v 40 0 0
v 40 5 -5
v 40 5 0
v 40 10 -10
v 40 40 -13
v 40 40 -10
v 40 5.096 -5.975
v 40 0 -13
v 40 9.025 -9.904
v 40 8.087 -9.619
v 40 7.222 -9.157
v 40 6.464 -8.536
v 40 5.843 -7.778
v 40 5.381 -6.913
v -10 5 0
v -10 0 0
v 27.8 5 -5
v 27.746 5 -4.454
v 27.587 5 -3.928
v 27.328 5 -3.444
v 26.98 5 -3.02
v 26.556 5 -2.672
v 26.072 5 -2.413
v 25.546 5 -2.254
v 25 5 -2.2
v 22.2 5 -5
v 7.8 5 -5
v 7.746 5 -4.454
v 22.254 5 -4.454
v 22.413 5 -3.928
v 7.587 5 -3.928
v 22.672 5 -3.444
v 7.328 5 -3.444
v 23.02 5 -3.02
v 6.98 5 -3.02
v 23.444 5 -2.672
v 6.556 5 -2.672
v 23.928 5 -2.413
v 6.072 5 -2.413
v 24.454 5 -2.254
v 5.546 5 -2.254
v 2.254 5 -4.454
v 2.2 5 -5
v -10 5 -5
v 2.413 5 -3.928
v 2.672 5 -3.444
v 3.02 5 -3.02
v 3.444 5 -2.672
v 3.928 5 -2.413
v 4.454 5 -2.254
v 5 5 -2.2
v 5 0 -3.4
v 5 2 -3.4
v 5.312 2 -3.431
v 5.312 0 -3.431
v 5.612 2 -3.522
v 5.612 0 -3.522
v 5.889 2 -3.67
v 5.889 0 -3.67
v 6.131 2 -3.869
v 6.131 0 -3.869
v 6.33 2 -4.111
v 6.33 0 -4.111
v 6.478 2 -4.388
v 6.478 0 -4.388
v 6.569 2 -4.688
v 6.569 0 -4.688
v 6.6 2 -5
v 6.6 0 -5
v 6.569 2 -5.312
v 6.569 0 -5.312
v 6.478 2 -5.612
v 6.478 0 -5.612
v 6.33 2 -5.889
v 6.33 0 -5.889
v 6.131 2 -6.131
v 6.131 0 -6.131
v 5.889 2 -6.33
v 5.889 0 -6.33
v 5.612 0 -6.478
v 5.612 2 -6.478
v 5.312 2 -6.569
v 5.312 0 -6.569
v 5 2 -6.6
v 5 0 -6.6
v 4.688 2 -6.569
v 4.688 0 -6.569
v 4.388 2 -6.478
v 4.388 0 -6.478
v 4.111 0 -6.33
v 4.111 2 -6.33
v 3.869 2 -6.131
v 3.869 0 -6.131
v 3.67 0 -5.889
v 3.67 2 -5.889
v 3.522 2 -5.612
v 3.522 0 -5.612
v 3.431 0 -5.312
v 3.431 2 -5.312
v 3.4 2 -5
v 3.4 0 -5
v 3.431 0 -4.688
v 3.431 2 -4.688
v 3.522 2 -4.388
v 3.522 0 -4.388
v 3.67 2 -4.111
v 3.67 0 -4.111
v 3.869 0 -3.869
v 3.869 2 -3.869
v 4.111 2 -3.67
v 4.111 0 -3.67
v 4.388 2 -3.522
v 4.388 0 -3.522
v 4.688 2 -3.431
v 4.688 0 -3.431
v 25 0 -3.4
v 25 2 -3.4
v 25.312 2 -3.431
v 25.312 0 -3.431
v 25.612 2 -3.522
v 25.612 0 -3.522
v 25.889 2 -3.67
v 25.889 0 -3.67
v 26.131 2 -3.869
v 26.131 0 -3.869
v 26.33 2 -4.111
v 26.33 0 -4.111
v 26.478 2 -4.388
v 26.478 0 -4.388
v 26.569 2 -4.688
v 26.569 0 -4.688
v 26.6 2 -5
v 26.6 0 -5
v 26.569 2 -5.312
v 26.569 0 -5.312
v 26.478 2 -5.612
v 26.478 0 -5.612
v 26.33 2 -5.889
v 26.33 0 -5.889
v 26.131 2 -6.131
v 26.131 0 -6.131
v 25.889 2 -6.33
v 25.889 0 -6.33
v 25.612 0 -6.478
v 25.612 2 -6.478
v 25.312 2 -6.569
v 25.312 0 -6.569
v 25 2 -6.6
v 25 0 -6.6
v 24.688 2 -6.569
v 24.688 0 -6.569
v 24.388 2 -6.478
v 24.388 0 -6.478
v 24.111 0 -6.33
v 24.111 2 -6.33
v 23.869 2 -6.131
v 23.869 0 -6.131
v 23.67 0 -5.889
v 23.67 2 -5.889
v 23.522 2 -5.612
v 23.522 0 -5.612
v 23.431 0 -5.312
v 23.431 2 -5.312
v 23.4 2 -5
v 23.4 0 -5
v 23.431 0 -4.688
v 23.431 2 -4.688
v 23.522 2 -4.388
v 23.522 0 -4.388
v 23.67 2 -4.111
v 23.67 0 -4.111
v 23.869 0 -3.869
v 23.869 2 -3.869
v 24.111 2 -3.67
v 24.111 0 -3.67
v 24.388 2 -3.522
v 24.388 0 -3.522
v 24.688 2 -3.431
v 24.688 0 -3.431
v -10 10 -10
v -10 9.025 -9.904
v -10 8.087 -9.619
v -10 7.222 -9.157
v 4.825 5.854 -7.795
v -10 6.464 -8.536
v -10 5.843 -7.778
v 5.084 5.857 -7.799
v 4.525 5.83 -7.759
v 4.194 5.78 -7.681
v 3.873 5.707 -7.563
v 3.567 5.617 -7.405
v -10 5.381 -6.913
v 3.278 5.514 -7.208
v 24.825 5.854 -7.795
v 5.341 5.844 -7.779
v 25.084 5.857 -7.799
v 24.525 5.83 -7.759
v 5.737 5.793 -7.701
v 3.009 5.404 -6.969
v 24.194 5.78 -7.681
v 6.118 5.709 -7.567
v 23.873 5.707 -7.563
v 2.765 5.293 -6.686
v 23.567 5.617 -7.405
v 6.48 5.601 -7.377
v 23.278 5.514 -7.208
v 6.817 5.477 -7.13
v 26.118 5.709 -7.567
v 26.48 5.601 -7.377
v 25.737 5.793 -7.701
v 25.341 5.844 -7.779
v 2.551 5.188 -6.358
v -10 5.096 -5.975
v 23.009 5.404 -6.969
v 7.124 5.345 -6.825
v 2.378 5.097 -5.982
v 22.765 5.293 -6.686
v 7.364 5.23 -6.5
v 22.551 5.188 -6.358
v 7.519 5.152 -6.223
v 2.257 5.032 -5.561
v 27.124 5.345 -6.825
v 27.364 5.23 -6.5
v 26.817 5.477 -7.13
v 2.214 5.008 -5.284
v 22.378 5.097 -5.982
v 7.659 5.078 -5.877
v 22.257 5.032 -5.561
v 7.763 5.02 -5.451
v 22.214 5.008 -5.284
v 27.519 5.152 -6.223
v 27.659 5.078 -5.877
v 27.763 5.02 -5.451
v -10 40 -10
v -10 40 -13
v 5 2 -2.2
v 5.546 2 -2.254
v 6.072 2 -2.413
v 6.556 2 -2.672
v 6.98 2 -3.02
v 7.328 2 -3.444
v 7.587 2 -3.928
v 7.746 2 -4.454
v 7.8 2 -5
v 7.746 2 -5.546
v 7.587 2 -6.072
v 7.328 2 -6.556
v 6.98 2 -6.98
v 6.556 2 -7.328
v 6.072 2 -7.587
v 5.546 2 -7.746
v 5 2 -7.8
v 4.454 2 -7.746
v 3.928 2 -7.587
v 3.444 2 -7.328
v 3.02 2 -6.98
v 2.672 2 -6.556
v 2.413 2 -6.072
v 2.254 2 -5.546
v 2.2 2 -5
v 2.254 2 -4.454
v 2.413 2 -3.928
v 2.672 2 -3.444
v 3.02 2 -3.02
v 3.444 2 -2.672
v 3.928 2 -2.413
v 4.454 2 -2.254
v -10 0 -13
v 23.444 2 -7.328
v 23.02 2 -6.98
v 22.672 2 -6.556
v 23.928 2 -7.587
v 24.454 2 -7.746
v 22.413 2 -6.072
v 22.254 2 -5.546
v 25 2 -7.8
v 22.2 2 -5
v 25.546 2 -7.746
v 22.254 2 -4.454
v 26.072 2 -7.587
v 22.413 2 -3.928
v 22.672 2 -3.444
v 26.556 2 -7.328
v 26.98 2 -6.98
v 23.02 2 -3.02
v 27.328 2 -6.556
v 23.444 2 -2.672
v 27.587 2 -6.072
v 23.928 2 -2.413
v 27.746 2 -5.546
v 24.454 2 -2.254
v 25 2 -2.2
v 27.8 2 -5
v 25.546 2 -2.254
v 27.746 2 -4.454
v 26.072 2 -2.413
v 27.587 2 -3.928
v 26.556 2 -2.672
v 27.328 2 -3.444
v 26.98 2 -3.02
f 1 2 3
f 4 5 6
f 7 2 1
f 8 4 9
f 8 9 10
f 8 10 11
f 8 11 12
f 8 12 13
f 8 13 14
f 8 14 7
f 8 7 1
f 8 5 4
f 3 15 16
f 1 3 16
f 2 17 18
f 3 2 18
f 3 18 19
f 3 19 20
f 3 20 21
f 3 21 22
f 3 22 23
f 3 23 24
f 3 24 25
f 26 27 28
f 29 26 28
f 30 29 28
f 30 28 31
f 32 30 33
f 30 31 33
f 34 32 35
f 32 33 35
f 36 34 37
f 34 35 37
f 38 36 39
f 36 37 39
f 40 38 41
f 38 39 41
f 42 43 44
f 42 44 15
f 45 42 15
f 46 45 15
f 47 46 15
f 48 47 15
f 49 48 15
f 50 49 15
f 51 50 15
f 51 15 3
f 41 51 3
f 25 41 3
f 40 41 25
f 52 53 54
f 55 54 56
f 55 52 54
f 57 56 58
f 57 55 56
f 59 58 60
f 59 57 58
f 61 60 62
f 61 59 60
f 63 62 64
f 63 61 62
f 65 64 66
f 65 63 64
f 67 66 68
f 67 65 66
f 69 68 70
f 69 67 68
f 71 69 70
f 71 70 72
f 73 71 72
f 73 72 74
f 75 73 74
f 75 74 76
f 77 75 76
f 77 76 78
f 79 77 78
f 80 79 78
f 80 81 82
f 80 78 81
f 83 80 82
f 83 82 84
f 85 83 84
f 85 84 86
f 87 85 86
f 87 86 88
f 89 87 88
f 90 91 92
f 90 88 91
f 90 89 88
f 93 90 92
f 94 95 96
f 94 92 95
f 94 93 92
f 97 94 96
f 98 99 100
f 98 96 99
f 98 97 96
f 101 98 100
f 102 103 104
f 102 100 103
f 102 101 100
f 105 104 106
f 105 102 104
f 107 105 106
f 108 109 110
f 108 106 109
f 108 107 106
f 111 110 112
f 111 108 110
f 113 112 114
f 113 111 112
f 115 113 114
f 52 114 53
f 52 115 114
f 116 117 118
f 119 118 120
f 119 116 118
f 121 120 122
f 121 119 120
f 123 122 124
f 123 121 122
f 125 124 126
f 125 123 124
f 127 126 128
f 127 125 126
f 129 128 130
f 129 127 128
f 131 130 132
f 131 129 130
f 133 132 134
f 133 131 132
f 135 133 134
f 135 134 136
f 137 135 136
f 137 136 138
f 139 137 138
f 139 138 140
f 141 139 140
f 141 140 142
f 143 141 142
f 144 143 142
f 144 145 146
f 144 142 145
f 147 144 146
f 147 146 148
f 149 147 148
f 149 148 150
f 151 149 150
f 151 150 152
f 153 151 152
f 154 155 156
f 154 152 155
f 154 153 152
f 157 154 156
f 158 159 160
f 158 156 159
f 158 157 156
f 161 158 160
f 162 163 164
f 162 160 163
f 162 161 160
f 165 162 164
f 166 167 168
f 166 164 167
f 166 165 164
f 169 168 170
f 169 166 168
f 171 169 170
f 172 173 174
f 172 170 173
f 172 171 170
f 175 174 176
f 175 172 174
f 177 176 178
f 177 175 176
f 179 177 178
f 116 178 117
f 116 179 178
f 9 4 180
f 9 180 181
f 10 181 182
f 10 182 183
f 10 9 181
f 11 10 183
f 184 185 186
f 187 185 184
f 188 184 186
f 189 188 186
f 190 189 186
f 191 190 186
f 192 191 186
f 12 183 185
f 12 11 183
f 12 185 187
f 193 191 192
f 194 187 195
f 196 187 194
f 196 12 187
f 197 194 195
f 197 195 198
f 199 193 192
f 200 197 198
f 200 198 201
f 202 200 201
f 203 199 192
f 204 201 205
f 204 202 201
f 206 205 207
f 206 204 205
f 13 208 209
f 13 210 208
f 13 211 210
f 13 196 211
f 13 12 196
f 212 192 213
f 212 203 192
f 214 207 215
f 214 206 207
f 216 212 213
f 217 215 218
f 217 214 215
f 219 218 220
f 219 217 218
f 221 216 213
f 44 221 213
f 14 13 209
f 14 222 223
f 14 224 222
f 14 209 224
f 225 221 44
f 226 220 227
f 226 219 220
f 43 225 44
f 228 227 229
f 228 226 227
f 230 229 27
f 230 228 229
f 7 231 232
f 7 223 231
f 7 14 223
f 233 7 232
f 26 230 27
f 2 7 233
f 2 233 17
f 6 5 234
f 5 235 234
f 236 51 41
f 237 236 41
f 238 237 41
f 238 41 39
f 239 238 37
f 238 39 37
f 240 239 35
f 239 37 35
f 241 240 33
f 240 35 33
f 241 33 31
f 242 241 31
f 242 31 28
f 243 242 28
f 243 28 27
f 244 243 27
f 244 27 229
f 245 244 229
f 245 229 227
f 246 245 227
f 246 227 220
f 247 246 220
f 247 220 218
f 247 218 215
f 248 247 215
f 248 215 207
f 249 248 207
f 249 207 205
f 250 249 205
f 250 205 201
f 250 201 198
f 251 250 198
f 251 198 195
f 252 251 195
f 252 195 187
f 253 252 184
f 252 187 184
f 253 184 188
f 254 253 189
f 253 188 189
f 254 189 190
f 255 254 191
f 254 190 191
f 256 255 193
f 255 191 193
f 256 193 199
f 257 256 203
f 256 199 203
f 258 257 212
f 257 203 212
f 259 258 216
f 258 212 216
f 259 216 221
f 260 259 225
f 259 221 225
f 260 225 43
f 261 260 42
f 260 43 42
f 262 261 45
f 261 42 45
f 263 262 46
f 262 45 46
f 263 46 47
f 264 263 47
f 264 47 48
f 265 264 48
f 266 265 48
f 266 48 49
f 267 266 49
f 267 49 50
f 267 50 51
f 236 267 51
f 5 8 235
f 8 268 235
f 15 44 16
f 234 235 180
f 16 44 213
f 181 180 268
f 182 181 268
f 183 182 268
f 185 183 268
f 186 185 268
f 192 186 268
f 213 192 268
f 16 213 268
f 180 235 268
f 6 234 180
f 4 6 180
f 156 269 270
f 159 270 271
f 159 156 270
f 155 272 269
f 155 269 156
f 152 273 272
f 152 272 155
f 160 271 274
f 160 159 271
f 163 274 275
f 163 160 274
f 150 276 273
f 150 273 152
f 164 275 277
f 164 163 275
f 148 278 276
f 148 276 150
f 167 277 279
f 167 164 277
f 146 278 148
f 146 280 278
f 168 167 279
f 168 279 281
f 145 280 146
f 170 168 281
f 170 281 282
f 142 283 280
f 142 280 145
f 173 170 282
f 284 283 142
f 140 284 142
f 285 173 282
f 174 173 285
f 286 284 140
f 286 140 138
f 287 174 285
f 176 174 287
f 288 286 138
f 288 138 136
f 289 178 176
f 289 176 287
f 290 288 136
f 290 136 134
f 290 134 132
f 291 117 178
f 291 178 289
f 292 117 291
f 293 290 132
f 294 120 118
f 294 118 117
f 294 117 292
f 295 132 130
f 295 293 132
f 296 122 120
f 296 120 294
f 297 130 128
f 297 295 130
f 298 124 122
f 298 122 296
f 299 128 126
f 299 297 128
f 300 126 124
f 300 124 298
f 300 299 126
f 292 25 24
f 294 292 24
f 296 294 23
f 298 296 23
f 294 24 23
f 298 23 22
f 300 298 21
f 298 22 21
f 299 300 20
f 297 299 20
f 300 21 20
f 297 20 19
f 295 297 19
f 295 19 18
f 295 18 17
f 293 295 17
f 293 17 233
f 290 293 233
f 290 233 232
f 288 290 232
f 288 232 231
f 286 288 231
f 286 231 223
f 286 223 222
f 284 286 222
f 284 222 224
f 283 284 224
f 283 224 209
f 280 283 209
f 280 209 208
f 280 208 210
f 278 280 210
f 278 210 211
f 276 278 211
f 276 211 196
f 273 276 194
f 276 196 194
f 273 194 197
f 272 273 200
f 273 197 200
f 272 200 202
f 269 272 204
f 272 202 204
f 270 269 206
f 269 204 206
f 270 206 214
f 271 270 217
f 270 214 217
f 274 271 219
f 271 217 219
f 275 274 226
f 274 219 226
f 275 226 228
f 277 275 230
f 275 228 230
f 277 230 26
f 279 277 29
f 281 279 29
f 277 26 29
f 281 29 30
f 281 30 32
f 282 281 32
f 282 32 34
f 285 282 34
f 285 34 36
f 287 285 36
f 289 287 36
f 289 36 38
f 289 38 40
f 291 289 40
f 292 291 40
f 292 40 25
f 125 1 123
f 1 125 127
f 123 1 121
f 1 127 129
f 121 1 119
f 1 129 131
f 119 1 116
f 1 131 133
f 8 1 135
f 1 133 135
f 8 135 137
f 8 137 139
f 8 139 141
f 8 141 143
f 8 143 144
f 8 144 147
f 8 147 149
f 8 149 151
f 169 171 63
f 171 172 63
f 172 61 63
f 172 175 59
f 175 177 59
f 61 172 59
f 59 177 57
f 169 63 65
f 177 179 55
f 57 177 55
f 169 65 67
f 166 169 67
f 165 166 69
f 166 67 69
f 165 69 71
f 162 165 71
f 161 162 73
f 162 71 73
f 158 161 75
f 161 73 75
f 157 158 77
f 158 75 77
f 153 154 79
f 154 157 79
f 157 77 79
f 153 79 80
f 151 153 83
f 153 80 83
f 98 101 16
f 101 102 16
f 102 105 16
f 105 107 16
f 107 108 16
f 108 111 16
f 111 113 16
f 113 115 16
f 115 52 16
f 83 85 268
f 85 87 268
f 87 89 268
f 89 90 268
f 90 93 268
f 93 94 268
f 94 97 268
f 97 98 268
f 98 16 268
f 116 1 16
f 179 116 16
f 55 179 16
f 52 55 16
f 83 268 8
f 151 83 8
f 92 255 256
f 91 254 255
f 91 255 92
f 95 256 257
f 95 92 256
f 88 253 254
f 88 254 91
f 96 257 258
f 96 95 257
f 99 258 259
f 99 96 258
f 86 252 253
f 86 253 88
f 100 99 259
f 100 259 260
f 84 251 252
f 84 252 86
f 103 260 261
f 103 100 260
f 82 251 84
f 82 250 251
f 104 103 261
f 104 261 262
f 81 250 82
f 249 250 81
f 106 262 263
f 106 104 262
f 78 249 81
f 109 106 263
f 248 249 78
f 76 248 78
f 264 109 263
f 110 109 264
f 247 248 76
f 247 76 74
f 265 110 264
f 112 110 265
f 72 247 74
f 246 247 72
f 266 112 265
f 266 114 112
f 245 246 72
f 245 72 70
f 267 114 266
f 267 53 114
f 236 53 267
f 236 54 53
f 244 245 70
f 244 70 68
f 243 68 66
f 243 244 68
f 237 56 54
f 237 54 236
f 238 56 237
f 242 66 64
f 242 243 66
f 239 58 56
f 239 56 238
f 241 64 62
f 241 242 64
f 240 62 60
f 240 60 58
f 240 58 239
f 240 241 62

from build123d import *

# Parameters (mm, degrees)
CROQUIS1_W                   = 30
CROQUIS1_H                   = 10
CROQUIS1_R                   = 1.6
SALIENTE_EXTRUIR1_DEPTH      = 5
CROQUIS2_R                   = 2.8
CORTAR_EXTRUIR1_DEPTH        = 3
SALIENTE_EXTRUIR2_DEPTH      = 10
SALIENTE_EXTRUIR2_DEPTH_BACK = 30
CROQUIS3_W                   = 3
CROQUIS3_H                   = 40
CROQUIS4_W                   = 10
CROQUIS4_H                   = 5
SALIENTE_EXTRUIR3_DEPTH      = 10
SALIENTE_EXTRUIR4_DEPTH      = 10
REDONDEO1_R                  = 5


with BuildPart() as part:
    # Croquis1 → Saliente-Extruir1 (new body)
    with BuildSketch(Plane(origin=(0, 0, 0), x_dir=(1, 0, 0), z_dir=(0, 1, 0))):
        with Locations((15, 5)):
            Rectangle(CROQUIS1_W, CROQUIS1_H)
        with Locations(Location((5, 5, 0), (0, 0, 270))):
            Circle(CROQUIS1_R, mode=Mode.SUBTRACT)
        with Locations(Location((25, 5, 0), (0, 0, 270))):
            Circle(CROQUIS1_R, mode=Mode.SUBTRACT)
    extrude(amount=SALIENTE_EXTRUIR1_DEPTH)

    # Croquis2 → Cortar-Extruir1 (cut)
    with BuildSketch(Plane(origin=(0, 5, 0), x_dir=(1, 0, 0), z_dir=(0, 1, 0))):
        with Locations(Location((5, 5, 0), (0, 0, 270))):
            Circle(CROQUIS2_R)
        with Locations(Location((25, 5, 0), (0, 0, 270))):
            Circle(CROQUIS2_R)
    extrude(amount=-CORTAR_EXTRUIR1_DEPTH, mode=Mode.SUBTRACT)

    # Croquis3 → Saliente-Extruir2 (add, two sides: drawn at the far end of the back side and taken through both)
    with BuildSketch(Plane.ZY.offset(-SALIENTE_EXTRUIR2_DEPTH_BACK)):
        with Locations((-11.5, 20)):
            Rectangle(CROQUIS3_W, CROQUIS3_H)
    extrude(amount=SALIENTE_EXTRUIR2_DEPTH + SALIENTE_EXTRUIR2_DEPTH_BACK)

    # Croquis4 → Saliente-Extruir3 (add)
    with BuildSketch(Plane.ZY):
        with Locations((-5, 2.5)):
            Rectangle(CROQUIS4_W, CROQUIS4_H)
    extrude(amount=SALIENTE_EXTRUIR3_DEPTH)

    # Croquis5 → Saliente-Extruir4 (add)
    with BuildSketch(Plane(origin=(30, 0, 0), x_dir=(0, 0, -1), z_dir=(1, 0, 0))):
        Polygon((0, 0), (13, 0), (13, 40), (10, 40), (10, 5), (0, 5), align=None)
    extrude(amount=SALIENTE_EXTRUIR4_DEPTH)

    # Redondeo1
    # the kernel refuses this fillet: 5 mm, written as the material it adds along each edge
    with BuildSketch(Plane(origin=(40, 5, -10), x_dir=(0, 1, 0), z_dir=(-1, 0, 0))) as redondeo1_piece_1_section:
        with BuildLine():
            CenterArc((REDONDEO1_R, -REDONDEO1_R), REDONDEO1_R, 90, 90)
            Line((0, -REDONDEO1_R), (0, 0))
            Line((0, 0), (REDONDEO1_R, 0))
        make_face()
    redondeo1_piece_1 = extrude(amount=50, mode=Mode.PRIVATE)
    redondeo1_piece_1 = redondeo1_piece_1 - Plane(origin=(5, 6.156265405, -5), x_dir=(0, 0, 1), z_dir=(0, 1, 0)) * Cylinder(2.8, 120, mode=Mode.PRIVATE)
    redondeo1_piece_1 = redondeo1_piece_1 - Plane(origin=(25, 6.156265405, -5), x_dir=(0, 0, 1), z_dir=(0, 1, 0)) * Cylinder(2.8, 120, mode=Mode.PRIVATE)
    add(redondeo1_piece_1)


solid = part.part
